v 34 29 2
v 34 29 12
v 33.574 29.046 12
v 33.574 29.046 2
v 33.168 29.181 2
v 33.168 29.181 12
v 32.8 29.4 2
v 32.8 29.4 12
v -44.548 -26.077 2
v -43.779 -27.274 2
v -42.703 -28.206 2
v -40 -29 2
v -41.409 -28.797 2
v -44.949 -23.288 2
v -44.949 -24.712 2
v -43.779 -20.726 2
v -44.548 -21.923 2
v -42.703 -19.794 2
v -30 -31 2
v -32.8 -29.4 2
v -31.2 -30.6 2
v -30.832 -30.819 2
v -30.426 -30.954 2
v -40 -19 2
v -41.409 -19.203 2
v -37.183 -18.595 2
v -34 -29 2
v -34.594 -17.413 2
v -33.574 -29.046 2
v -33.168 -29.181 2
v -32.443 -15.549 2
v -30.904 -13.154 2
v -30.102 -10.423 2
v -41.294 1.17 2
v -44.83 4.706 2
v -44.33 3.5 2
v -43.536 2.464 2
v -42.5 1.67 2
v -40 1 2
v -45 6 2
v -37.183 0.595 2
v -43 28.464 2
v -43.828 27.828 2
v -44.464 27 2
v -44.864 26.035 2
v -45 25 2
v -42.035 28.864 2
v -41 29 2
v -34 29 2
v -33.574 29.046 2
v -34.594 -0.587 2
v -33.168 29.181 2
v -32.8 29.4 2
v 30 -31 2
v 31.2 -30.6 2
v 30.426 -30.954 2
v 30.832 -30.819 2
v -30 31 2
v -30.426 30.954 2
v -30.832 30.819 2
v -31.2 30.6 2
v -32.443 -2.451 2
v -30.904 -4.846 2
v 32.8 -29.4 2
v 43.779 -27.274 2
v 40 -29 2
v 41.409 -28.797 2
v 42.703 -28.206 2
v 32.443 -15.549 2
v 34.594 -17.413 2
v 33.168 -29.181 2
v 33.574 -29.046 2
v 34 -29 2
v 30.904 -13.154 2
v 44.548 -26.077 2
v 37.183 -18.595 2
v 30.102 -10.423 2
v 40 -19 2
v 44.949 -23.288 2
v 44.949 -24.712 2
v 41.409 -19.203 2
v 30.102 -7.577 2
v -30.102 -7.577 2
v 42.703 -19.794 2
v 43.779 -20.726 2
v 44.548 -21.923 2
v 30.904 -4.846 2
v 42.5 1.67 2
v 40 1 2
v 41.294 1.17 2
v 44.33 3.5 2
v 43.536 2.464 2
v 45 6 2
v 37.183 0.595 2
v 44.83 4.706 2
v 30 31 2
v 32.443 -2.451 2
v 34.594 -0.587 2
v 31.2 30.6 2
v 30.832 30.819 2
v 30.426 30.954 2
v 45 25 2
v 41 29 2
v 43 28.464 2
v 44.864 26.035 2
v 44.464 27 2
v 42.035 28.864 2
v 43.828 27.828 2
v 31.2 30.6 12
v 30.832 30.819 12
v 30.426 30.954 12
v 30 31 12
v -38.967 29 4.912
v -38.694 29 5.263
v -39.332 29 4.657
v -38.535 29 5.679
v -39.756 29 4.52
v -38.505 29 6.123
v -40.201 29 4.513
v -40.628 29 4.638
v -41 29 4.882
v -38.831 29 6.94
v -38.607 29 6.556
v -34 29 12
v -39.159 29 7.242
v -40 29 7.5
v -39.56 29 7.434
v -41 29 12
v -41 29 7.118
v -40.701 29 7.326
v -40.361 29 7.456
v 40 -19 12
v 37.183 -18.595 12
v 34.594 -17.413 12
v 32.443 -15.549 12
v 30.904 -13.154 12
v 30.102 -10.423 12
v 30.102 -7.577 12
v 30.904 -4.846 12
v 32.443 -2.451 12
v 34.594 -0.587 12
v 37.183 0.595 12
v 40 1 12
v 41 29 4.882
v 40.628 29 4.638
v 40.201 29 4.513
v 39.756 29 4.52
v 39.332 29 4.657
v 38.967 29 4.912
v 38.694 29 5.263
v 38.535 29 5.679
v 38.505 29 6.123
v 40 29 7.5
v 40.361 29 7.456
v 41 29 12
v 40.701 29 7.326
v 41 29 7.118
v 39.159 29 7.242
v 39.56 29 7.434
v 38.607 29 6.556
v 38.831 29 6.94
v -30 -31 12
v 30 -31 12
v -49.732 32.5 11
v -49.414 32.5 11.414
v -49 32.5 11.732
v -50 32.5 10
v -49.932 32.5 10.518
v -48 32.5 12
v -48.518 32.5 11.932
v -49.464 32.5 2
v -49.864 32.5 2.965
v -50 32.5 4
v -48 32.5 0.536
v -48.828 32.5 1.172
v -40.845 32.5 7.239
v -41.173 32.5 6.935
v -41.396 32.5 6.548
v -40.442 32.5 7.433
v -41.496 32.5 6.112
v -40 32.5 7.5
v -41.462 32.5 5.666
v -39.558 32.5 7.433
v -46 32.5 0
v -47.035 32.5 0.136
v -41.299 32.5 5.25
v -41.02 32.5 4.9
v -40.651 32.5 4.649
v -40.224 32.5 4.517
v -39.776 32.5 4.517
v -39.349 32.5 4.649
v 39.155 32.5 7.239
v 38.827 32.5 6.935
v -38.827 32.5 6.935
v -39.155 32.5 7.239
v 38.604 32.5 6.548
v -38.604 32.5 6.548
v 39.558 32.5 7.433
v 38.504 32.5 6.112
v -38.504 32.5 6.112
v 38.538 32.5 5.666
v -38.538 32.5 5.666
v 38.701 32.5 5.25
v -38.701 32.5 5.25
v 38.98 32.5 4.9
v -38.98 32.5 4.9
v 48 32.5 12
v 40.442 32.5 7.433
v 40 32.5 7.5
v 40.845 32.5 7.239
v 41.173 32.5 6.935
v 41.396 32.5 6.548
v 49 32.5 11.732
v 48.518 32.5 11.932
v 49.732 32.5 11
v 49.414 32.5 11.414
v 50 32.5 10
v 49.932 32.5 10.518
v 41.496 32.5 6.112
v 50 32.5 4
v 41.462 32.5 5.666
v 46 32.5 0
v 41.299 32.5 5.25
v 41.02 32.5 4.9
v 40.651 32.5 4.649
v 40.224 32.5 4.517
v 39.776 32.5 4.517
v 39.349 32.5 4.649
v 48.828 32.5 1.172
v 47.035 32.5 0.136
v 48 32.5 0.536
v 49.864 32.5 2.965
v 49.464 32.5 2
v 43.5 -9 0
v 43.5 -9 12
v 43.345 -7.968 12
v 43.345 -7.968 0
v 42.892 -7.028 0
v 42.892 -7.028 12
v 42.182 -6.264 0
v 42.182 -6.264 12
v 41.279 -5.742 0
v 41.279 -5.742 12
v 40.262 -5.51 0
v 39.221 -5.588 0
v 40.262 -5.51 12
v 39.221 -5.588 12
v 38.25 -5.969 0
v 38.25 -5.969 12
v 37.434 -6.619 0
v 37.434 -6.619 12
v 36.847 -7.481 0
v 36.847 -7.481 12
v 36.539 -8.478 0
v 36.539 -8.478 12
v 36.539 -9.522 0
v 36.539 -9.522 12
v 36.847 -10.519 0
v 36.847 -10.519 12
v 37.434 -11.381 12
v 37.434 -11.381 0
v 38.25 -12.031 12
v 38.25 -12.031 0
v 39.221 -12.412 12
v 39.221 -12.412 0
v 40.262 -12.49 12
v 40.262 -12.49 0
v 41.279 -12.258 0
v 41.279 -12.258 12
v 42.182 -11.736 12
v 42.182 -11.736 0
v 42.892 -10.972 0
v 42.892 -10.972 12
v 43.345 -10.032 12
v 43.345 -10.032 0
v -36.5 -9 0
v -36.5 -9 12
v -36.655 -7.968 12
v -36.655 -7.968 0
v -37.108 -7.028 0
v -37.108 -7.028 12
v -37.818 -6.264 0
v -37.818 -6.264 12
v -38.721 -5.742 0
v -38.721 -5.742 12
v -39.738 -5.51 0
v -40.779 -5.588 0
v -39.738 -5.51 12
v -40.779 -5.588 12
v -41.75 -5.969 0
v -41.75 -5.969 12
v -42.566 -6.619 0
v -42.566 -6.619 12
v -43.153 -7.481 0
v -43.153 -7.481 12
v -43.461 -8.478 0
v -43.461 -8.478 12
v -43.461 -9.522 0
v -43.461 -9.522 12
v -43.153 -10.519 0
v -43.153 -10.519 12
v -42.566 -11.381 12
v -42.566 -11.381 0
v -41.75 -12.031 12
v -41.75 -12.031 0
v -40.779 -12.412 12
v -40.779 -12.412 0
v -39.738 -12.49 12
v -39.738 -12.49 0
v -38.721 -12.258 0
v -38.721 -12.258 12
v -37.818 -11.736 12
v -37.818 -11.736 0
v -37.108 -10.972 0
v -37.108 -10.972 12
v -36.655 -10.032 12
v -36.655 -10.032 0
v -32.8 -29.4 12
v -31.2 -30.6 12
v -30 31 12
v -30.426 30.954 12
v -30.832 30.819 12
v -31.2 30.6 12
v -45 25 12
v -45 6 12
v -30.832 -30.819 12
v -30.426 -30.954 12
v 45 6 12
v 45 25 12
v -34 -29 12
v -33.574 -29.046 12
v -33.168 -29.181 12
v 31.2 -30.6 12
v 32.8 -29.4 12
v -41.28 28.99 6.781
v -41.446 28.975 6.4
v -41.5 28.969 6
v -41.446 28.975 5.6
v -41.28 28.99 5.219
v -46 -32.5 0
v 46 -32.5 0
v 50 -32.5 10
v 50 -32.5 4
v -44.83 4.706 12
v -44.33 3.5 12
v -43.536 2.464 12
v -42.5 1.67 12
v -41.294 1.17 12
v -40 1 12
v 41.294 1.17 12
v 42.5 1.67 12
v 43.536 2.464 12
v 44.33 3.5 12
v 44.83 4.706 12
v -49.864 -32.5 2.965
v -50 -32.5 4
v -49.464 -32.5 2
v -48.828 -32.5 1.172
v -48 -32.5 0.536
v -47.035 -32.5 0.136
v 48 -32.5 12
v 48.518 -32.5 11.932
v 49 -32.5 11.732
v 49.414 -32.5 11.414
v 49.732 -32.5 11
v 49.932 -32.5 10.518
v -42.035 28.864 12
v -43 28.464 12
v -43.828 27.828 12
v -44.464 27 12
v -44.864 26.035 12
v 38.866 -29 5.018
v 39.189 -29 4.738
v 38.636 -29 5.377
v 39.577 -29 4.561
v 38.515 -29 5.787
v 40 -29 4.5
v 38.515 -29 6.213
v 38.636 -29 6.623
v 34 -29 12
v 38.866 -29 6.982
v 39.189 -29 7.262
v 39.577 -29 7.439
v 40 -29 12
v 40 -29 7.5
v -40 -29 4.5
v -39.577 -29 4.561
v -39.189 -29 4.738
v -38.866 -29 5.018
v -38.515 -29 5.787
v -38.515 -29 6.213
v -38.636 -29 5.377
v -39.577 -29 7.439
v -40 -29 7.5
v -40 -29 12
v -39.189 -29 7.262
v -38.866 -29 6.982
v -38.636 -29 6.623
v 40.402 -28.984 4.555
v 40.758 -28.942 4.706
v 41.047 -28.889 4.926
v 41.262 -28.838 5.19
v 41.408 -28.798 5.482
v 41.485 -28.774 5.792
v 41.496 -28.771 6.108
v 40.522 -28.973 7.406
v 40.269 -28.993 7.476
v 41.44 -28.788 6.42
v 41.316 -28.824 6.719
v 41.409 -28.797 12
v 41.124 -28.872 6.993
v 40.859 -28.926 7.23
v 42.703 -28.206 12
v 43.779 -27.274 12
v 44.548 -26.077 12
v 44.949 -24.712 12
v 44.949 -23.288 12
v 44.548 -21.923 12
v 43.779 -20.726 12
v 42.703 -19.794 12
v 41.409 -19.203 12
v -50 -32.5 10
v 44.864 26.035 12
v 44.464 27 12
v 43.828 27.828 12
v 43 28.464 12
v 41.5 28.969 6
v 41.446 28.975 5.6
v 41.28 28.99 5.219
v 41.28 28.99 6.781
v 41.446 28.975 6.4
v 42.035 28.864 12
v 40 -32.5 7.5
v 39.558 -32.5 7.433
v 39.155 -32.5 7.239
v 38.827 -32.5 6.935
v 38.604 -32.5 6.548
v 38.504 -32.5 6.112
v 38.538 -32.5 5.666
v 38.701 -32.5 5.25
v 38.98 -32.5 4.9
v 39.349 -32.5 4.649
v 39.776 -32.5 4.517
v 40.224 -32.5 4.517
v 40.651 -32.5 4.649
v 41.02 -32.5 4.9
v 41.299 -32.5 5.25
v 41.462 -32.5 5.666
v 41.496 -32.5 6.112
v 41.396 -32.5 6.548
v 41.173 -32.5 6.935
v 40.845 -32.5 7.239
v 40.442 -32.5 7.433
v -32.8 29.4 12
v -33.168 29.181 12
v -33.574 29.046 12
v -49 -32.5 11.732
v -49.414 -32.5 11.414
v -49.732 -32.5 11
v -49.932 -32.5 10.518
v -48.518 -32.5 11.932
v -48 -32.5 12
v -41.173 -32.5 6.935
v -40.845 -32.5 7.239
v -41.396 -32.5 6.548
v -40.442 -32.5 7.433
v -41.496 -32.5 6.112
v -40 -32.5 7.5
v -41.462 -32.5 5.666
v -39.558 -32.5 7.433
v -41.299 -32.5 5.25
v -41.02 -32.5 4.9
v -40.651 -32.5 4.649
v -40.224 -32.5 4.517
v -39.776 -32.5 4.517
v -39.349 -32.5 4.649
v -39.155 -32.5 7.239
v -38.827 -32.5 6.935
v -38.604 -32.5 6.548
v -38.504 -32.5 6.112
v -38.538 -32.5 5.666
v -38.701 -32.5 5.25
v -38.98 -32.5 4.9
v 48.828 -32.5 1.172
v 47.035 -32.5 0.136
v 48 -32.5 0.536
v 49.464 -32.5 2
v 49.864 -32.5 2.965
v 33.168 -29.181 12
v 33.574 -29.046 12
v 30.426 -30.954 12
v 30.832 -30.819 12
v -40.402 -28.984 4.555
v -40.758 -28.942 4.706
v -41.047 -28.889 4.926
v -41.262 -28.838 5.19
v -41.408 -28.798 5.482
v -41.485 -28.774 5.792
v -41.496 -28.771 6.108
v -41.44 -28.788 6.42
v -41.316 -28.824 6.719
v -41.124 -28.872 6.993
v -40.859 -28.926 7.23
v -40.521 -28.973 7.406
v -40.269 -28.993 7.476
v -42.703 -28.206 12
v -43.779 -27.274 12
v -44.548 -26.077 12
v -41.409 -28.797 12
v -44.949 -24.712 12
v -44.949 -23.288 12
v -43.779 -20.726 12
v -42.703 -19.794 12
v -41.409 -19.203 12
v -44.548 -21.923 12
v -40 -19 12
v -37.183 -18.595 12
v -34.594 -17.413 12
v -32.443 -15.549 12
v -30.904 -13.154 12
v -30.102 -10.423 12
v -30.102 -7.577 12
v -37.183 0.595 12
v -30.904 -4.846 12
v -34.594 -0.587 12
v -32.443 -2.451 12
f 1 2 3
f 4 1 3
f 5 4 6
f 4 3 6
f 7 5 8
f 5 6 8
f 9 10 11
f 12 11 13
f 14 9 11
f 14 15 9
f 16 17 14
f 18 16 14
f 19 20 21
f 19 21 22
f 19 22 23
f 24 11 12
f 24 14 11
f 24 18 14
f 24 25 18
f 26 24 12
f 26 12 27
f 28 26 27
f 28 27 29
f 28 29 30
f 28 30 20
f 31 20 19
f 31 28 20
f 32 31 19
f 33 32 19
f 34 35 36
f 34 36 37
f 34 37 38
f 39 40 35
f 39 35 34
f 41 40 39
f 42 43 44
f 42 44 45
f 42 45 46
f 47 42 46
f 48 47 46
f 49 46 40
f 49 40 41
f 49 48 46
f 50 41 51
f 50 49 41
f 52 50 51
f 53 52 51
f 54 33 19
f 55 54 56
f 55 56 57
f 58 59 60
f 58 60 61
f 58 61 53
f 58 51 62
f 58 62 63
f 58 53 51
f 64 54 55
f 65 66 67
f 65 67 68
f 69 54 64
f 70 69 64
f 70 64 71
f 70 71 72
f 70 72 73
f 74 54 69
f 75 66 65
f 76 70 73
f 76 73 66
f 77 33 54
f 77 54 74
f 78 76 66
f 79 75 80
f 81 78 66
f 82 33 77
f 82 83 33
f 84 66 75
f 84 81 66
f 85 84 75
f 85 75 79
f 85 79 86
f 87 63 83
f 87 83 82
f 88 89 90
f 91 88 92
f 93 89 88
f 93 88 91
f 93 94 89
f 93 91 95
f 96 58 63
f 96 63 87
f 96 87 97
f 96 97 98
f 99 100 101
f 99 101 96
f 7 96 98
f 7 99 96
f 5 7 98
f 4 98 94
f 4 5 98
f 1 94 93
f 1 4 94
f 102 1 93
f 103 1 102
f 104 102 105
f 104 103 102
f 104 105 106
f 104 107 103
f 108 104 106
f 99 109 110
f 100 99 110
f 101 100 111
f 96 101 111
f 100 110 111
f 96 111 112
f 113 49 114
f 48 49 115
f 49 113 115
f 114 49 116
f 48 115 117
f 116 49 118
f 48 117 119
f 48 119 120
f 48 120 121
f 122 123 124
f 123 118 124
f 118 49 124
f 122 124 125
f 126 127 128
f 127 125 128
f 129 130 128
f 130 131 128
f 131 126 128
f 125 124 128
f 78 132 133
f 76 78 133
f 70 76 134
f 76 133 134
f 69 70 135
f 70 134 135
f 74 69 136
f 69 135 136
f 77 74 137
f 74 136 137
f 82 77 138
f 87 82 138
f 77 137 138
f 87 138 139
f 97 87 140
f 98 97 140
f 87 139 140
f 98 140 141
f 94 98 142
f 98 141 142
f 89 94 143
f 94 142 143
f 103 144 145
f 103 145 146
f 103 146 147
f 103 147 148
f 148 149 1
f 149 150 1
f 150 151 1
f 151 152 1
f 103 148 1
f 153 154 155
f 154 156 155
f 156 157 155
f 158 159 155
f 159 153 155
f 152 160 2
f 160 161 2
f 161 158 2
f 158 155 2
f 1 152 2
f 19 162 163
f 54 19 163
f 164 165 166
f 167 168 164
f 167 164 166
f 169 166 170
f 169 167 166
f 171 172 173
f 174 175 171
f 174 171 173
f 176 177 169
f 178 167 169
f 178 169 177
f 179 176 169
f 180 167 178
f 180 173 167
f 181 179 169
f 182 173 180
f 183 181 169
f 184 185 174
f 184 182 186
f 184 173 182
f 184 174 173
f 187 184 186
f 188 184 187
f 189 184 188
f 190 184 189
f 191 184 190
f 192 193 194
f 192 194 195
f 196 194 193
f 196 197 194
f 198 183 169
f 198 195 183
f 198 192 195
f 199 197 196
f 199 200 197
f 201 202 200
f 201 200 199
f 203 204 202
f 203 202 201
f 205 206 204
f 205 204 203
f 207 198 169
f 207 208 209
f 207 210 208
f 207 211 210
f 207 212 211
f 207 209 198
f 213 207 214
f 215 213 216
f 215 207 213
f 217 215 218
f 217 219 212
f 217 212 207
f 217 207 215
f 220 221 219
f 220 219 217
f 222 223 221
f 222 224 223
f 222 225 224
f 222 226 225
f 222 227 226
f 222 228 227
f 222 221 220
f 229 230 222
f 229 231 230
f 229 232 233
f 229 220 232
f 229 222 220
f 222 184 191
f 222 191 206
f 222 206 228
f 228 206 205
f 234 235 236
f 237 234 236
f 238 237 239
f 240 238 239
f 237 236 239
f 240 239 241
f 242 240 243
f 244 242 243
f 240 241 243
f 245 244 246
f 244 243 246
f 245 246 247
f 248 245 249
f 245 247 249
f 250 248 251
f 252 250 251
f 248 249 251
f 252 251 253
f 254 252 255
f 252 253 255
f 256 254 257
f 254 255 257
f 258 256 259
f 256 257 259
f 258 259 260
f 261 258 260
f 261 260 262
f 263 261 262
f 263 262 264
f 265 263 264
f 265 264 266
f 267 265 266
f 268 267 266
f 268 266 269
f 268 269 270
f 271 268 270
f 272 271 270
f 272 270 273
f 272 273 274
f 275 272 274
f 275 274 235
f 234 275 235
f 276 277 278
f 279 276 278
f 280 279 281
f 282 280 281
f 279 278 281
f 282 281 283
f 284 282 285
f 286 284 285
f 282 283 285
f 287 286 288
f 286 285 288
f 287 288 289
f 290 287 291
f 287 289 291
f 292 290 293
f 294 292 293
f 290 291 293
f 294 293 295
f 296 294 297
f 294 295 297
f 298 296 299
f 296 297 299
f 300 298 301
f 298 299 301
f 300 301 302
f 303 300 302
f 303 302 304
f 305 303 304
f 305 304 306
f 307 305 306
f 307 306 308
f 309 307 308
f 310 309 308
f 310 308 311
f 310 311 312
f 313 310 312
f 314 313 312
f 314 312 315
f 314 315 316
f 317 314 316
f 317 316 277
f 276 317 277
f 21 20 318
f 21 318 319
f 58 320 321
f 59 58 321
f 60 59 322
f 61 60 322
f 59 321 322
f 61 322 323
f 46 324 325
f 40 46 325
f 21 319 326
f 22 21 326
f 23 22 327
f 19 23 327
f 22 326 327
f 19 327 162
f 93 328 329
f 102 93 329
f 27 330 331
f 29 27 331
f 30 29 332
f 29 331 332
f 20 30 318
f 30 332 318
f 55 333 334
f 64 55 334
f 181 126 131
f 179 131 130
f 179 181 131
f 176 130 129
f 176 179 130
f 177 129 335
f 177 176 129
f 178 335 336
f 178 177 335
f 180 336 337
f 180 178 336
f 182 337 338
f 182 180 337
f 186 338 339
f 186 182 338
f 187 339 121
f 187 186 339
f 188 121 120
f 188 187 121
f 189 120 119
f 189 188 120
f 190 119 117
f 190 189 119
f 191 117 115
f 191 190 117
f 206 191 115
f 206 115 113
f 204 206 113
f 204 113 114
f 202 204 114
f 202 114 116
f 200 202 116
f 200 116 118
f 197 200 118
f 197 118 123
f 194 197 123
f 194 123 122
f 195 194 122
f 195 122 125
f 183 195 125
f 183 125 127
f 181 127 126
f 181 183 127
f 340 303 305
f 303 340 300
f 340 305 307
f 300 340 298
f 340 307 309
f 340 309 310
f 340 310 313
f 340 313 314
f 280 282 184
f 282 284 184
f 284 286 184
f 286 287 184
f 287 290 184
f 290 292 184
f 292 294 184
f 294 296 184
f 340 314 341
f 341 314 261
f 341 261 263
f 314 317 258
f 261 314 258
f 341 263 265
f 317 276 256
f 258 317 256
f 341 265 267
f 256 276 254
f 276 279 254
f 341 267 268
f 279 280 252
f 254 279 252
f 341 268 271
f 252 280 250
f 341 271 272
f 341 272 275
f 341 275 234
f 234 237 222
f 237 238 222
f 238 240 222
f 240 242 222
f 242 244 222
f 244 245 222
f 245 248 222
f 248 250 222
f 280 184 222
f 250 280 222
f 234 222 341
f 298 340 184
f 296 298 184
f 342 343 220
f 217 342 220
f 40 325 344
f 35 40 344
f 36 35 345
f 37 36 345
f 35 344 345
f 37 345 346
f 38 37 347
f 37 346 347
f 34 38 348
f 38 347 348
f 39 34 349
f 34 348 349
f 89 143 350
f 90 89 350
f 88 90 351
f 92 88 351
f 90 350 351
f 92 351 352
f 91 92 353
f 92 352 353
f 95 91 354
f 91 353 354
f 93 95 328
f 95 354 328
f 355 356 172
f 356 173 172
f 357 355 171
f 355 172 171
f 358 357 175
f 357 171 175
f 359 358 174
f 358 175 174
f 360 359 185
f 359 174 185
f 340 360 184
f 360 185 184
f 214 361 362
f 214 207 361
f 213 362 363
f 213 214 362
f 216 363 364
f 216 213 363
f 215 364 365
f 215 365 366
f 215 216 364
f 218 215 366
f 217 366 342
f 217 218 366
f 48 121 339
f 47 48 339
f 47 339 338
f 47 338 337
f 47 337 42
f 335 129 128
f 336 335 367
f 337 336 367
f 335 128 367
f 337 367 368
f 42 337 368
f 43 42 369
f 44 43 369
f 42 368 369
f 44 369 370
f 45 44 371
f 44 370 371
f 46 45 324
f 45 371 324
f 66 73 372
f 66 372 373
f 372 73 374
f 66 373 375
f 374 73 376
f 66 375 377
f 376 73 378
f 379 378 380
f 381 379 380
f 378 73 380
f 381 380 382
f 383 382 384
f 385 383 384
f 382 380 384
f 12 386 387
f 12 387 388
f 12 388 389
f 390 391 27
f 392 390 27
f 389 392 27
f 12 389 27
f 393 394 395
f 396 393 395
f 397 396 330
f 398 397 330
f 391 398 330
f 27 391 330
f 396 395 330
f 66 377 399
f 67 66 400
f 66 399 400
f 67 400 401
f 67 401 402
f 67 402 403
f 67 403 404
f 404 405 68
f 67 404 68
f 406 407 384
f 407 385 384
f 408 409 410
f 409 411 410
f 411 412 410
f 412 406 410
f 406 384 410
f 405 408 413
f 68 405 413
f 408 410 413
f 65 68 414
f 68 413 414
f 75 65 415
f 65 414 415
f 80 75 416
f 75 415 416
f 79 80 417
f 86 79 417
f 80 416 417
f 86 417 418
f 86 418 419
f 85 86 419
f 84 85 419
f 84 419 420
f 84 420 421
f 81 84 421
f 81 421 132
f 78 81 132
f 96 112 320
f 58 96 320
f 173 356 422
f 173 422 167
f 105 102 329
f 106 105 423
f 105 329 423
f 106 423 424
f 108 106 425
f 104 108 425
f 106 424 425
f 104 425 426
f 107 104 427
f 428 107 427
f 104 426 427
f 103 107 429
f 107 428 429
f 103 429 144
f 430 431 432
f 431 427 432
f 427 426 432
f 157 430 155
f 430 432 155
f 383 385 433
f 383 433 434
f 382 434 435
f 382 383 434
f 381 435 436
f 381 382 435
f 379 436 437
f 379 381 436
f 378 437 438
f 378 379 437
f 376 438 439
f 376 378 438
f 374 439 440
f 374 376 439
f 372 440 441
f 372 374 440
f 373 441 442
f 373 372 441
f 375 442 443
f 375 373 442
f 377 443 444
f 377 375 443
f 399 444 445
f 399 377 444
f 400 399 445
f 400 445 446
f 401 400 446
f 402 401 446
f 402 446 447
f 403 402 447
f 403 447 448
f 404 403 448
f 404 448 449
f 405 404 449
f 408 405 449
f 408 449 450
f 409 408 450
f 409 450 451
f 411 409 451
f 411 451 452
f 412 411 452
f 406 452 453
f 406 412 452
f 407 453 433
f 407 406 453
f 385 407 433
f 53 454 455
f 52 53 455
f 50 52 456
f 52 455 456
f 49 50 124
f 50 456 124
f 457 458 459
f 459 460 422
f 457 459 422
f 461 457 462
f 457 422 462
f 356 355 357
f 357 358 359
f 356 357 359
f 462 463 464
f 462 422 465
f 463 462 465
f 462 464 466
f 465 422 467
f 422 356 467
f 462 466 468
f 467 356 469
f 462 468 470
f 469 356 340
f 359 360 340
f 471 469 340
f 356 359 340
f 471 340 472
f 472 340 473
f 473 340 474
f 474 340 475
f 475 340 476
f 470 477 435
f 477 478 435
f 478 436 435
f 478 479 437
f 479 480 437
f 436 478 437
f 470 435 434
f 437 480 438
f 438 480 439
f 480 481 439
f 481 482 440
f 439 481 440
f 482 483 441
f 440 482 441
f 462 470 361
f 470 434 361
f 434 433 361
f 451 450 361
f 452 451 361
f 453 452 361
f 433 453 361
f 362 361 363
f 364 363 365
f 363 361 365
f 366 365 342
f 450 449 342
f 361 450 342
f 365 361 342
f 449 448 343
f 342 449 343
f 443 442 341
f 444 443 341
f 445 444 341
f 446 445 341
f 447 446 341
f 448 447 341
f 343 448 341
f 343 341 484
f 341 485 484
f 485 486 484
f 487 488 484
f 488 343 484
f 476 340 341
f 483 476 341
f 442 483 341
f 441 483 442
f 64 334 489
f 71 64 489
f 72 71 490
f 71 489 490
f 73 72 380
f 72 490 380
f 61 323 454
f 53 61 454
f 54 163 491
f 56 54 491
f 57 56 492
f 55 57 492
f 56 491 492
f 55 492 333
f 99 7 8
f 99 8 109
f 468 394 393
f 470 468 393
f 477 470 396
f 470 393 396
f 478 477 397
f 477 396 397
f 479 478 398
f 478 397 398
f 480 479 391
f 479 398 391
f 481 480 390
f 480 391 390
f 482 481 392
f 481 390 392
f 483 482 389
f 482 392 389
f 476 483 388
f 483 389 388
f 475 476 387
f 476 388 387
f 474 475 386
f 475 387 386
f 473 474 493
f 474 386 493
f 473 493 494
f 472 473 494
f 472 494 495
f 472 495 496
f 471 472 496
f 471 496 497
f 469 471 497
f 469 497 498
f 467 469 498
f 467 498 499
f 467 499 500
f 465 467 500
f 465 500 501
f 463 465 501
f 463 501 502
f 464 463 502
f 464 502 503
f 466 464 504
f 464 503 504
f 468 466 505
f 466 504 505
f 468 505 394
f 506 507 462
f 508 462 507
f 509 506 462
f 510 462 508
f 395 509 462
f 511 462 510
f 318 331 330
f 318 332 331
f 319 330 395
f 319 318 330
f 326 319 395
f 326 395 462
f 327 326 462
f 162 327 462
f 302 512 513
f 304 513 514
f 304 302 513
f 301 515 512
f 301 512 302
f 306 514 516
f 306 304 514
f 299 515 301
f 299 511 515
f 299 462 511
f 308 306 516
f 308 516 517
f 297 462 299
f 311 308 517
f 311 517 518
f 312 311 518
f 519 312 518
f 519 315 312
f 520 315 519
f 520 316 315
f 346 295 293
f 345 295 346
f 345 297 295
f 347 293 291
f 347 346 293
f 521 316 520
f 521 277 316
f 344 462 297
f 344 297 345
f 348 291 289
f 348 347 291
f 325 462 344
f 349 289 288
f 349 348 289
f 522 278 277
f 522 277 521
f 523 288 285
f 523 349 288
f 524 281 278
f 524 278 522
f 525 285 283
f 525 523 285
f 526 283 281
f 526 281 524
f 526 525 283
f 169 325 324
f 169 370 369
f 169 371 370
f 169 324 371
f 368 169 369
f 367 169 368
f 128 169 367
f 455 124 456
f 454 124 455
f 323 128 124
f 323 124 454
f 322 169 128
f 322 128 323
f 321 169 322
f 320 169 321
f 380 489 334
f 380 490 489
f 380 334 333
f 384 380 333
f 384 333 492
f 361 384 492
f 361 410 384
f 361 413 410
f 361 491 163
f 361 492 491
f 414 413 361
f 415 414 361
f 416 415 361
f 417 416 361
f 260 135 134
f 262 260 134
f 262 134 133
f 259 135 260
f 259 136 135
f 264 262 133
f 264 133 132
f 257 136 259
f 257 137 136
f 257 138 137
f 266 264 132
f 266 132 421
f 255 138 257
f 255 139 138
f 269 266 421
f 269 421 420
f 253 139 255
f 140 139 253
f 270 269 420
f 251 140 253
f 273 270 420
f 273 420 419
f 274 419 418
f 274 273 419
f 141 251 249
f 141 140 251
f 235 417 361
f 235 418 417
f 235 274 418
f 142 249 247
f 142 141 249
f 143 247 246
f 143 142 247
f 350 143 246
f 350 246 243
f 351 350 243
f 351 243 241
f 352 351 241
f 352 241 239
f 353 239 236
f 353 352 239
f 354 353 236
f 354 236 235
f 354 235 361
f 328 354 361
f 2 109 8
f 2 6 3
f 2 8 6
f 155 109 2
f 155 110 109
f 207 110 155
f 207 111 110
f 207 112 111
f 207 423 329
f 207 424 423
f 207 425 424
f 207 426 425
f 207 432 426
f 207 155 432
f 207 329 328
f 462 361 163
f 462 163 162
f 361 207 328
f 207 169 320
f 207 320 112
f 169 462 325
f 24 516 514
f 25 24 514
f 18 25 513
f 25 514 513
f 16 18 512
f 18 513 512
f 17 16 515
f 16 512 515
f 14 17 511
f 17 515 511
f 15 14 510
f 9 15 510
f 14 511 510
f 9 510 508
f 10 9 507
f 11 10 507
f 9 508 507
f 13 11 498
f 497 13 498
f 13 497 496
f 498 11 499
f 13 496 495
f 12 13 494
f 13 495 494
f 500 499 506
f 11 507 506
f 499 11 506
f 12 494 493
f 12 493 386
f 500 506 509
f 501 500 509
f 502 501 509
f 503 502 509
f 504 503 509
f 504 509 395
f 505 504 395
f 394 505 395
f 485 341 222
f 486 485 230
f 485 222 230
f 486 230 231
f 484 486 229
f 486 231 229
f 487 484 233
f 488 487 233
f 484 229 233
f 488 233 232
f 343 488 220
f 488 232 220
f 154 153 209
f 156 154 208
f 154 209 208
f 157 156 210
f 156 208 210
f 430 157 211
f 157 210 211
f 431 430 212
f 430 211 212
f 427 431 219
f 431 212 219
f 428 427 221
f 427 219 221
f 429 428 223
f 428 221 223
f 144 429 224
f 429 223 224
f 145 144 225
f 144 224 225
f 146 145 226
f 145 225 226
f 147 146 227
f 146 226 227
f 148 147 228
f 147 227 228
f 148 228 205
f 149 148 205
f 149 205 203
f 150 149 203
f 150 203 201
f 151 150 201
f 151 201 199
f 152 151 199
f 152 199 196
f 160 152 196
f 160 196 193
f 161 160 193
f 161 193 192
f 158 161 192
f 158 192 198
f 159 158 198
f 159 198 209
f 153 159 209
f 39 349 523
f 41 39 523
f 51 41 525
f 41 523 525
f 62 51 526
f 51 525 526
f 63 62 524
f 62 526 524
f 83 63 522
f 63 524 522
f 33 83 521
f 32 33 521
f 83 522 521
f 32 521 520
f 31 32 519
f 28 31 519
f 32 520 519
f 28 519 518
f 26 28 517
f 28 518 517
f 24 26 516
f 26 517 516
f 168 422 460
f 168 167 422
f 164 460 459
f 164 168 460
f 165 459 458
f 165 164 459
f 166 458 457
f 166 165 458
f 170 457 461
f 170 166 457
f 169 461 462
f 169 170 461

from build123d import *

# Parameters (mm, degrees)
SKETCH_1_W          = 100
SKETCH_1_H          = 65
EXTRUDE_1_DEPTH     = 12
CUT_EXTRUDE_1_DEPTH = 10
SKETCH_2_3_R        = 3.5
CUT_EXTRUDE_2_DEPTH = 61.829680256
SKETCH_3_R          = 1.5
CUT_EXTRUDE_3_DEPTH = 10
CUT_EXTRUDE_START   = -10
SKETCH_4_R          = 1.5
CUT_EXTRUDE_4_DEPTH = 10
FILLET_2_R          = 4
FILLET_3_R          = 2


with BuildPart() as part:
    # 草图1 → 凸台-拉伸1 (new body)
    with BuildSketch(Plane.XY):
        Rectangle(SKETCH_1_W, SKETCH_1_H)
    extrude(amount=EXTRUDE_1_DEPTH)

    # 草图2 → 切除-拉伸1 (cut)
    with BuildSketch(Plane.XY.offset(12)):
        with BuildLine():
            Line((30, 31), (-30, 31))
            ThreePointArc((-30, 31), (-30.632455532, 30.897366596), (-31.2, 30.6))
            Line((-31.2, 30.6), (-32.8, 29.4))
            ThreePointArc((-32.8, 29.4), (-33.367544468, 29.102633404), (-34, 29))
            Line((-34, 29), (-41, 29))
            ThreePointArc((-41, 29), (-43.828427125, 27.828427125), (-45, 25))
            Line((-45, 25), (-45, 6))
            ThreePointArc((-45, 6), (-43.535533906, 2.464466094), (-40, 1))
            ThreePointArc((-40, 1), (-30, -9), (-40, -19))
            ThreePointArc((-40, -19), (-45, -24), (-40, -29))
            Line((-40, -29), (-34, -29))
            ThreePointArc((-34, -29), (-33.367544468, -29.102633404), (-32.8, -29.4))
            Line((-32.8, -29.4), (-31.2, -30.6))
            ThreePointArc((-31.2, -30.6), (-30.632455532, -30.897366596), (-30, -31))
            Line((-30, -31), (30, -31))
            ThreePointArc((30, -31), (30.632455532, -30.897366596), (31.2, -30.6))
            Line((31.2, -30.6), (32.8, -29.4))
            ThreePointArc((32.8, -29.4), (33.367544468, -29.102633404), (34, -29))
            Line((34, -29), (40, -29))
            ThreePointArc((40, -29), (45, -24), (40, -19))
            ThreePointArc((40, -19), (30, -9), (40, 1))
            ThreePointArc((40, 1), (43.535533906, 2.464466094), (45, 6))
            Line((45, 6), (45, 25))
            ThreePointArc((45, 25), (43.828427125, 27.828427125), (41, 29))
            Line((41, 29), (34, 29))
            ThreePointArc((34, 29), (33.367544468, 29.102633404), (32.8, 29.4))
            Line((32.8, 29.4), (31.2, 30.6))
            ThreePointArc((31.2, 30.6), (30.632455532, 30.897366596), (30, 31))
        make_face()
    extrude(amount=-CUT_EXTRUDE_1_DEPTH, mode=Mode.SUBTRACT)

    # 草图2<3> → 切除-拉伸2 (cut, through all)
    with BuildSketch(Plane.XY.offset(12)):
        with Locations((40, -9)):
            Circle(SKETCH_2_3_R)
        with Locations((-40, -9)):
            Circle(SKETCH_2_3_R)
    extrude(amount=-CUT_EXTRUDE_2_DEPTH, mode=Mode.SUBTRACT)

    # 草图3 → 切除-拉伸3 (cut)
    with BuildSketch(Plane(origin=(0, 32.5, 0), x_dir=(1, 0, 0), z_dir=(0, 1, 0))):
        with Locations(Location((40, -6, 0), (0, 0, 270))):
            Circle(SKETCH_3_R)
    cut_extrude_3 = extrude(amount=-CUT_EXTRUDE_3_DEPTH, mode=Mode.SUBTRACT)

    # 草图4 → 切除-拉伸4 (cut)
    with BuildSketch(Plane.XZ.offset(32.5).offset(CUT_EXTRUDE_START)):
        with Locations(Location((40, 6, 0), (0, 0, 90))):
            Circle(SKETCH_4_R)
    cut_extrude_4 = extrude(amount=CUT_EXTRUDE_4_DEPTH, mode=Mode.SUBTRACT)

    # 镜向1: 切除-拉伸3, 切除-拉伸4 across plane
    add(cut_extrude_3.mirror(Plane(origin=(0, 0, 0), x_dir=(0, 0, 1), z_dir=(1, 0, 0))), mode=Mode.SUBTRACT)
    add(cut_extrude_4.mirror(Plane(origin=(0, 0, 0), x_dir=(0, 0, 1), z_dir=(1, 0, 0))), mode=Mode.SUBTRACT)

    # 圆角2
    fillet_2_edges = [part.edges().sort_by_distance(p)[0] for p in [
        (-50, 0, 0),
        (50, 0, 0),
    ]]
    fillet(fillet_2_edges, radius=FILLET_2_R)

    # 圆角3
    fillet_3_edges = [part.edges().sort_by_distance(p)[0] for p in [
        (-50, 0, 12),
        (50, 0, 12),
    ]]
    fillet(fillet_3_edges, radius=FILLET_3_R)


solid = part.part
